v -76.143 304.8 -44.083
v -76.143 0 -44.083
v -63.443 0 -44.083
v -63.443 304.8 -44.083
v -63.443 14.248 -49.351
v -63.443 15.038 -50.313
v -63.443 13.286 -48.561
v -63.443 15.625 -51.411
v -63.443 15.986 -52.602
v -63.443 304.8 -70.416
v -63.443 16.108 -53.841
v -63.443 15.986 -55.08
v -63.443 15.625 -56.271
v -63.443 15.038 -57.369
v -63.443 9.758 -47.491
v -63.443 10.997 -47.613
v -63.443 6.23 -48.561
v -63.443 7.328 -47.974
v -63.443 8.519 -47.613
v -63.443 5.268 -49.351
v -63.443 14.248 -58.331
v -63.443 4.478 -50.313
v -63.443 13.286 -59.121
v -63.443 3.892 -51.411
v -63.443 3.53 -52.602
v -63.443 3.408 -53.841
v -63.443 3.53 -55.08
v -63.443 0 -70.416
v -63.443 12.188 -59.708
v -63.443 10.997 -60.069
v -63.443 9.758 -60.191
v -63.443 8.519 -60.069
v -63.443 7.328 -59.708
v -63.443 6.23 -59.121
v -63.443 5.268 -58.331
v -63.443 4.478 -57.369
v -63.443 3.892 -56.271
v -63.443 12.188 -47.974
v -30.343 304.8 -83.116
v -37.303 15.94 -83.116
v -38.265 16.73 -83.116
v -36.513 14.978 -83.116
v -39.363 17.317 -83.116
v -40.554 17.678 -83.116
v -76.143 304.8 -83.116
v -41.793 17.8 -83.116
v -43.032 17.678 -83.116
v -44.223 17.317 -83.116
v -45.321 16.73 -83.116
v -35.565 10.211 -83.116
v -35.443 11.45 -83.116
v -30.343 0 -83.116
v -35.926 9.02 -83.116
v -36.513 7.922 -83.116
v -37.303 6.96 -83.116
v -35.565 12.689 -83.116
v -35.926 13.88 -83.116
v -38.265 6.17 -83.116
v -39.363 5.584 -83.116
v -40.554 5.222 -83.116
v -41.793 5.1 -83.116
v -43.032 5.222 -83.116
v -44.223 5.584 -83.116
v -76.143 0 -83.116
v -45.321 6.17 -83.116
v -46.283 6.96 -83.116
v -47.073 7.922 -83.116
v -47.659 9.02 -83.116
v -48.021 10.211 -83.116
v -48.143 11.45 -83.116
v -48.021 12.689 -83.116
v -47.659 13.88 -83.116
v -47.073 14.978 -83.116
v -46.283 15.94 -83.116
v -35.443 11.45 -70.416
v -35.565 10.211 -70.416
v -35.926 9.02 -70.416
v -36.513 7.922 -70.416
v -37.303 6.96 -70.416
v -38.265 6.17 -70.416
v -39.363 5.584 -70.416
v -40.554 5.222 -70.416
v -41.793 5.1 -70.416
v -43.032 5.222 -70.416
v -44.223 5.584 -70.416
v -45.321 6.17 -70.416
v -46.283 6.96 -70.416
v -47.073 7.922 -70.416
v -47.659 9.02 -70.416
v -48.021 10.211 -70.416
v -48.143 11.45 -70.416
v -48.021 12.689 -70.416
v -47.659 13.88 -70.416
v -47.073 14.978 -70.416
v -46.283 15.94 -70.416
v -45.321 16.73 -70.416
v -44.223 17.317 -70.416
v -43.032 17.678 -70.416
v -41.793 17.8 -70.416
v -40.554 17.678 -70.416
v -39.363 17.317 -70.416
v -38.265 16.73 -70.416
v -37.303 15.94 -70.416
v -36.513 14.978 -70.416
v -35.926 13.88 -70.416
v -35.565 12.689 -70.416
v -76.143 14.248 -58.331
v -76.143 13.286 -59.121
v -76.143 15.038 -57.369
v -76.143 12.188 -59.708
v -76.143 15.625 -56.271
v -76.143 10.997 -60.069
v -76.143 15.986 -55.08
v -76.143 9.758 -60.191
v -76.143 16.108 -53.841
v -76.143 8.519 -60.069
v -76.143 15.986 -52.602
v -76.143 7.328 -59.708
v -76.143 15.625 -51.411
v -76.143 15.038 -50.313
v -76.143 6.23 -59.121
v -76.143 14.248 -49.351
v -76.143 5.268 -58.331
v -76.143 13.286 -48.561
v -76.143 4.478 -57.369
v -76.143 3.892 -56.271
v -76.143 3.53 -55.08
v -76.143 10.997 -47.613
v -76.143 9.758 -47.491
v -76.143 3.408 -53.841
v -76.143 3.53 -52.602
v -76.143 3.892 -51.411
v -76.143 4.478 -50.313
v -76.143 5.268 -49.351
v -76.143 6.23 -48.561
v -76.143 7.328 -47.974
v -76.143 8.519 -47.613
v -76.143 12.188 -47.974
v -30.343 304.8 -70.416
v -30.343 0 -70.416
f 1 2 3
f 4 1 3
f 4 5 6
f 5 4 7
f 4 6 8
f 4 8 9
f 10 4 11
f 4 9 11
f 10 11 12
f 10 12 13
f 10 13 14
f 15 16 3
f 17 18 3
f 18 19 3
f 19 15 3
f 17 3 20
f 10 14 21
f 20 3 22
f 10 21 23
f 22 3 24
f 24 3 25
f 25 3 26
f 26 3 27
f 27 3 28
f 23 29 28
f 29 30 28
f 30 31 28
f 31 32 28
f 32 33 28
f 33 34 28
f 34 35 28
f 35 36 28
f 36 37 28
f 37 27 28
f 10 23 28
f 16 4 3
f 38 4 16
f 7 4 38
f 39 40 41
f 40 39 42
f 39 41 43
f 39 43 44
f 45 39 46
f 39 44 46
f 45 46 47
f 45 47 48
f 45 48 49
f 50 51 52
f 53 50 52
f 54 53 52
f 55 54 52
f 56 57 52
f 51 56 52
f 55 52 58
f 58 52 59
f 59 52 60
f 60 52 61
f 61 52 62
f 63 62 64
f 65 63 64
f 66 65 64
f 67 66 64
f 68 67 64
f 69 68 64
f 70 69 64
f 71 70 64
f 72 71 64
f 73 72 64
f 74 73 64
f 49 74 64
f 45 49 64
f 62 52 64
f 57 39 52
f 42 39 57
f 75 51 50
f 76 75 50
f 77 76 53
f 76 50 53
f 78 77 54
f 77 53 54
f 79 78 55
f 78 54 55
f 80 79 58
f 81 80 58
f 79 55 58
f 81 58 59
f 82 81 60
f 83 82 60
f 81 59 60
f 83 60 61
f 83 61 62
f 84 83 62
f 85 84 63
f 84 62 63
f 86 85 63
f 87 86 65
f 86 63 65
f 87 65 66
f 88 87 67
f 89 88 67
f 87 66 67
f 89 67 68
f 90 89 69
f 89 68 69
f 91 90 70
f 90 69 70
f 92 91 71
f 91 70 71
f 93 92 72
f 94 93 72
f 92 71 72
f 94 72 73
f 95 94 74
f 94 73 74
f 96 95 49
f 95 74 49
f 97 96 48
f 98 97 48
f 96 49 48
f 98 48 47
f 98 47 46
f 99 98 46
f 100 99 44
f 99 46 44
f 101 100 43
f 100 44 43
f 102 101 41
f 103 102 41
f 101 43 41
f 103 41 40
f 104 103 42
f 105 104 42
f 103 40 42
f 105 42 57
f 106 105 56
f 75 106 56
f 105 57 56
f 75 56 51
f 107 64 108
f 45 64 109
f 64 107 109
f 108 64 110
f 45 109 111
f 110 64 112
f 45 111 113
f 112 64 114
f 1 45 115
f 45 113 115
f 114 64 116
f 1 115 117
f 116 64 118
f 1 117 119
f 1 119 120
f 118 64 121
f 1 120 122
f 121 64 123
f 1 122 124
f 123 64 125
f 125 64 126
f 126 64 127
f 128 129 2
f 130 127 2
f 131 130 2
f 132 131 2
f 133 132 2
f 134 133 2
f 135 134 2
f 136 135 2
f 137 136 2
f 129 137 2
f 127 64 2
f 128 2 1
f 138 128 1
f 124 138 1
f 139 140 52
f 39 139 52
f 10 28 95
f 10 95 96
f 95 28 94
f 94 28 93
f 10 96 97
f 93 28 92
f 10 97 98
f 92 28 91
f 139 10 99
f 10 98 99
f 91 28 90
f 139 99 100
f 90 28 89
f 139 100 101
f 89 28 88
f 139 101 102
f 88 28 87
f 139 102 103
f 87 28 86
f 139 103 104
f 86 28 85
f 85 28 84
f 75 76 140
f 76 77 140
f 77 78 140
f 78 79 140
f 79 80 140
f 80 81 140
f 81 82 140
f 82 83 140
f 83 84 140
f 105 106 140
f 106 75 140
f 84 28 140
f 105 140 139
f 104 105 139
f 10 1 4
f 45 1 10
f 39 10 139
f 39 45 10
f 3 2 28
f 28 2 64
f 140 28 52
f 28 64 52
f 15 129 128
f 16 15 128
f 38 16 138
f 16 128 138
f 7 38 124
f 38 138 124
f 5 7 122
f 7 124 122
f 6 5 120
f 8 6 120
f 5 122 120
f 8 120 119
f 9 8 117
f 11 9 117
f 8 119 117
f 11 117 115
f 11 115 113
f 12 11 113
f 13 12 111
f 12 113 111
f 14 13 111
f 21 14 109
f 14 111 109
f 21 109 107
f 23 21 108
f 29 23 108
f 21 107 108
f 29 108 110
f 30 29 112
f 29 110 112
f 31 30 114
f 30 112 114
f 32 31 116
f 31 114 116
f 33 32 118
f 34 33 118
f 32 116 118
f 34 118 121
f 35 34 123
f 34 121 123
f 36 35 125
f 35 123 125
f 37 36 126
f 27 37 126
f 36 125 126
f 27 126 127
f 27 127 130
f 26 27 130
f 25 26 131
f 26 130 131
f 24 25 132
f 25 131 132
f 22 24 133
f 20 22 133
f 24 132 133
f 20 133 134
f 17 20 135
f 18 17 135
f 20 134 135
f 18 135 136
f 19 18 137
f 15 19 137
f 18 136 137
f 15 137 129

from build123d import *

# Parameters (mm, degrees)
BOSS_EXTRUDE1_DEPTH = 304.8
CUT_EXTRUDE1_DEPTH  = 12.7
SKETCH3_R           = 6.35
CUT_EXTRUDE2_DEPTH  = 12.7


with BuildPart() as part:
    # Sketch1 → Boss-Extrude1 (new body)
    with BuildSketch(Plane(origin=(0, 0, 0), x_dir=(1, 0, 0), z_dir=(0, 1, 0))):
        Polygon((-76.143480967, 44.082766217), (-63.443480967, 44.082766217), (-63.443480967, 70.416025302), (-30.342534375, 70.416025302), (-30.342534375, 83.116025302), (-76.143480967, 83.116025302), align=None)
    extrude(amount=BOSS_EXTRUDE1_DEPTH)

    # Sketch2 → Cut-Extrude1 (cut)
    with BuildSketch(Plane(origin=(0, 0, -83.116025302), x_dir=(-1, 0, 0), z_dir=(0, 0, -1))):
        with BuildLine():
            ThreePointArc((48.142771023, 11.450236648), (41.792771023, 17.800236648), (35.442771023, 11.450236648))
            Line((35.442771023, 11.450236648), (48.142771023, 11.450236648))
        make_face()
        with BuildLine():
            Line((48.142771023, 11.450236648), (35.442771023, 11.450236648))
            ThreePointArc((35.442771023, 11.450236648), (41.792771023, 5.100236648), (48.142771023, 11.450236648))
        make_face()
    extrude(amount=-CUT_EXTRUDE1_DEPTH, mode=Mode.SUBTRACT)

    # Sketch3 → Cut-Extrude2 (cut)
    with BuildSketch(Plane.ZY.offset(76.143480967)):
        with Locations((-53.841080989, 9.758314771)):
            Circle(SKETCH3_R)
    extrude(amount=-CUT_EXTRUDE2_DEPTH, mode=Mode.SUBTRACT)


solid = part.part
